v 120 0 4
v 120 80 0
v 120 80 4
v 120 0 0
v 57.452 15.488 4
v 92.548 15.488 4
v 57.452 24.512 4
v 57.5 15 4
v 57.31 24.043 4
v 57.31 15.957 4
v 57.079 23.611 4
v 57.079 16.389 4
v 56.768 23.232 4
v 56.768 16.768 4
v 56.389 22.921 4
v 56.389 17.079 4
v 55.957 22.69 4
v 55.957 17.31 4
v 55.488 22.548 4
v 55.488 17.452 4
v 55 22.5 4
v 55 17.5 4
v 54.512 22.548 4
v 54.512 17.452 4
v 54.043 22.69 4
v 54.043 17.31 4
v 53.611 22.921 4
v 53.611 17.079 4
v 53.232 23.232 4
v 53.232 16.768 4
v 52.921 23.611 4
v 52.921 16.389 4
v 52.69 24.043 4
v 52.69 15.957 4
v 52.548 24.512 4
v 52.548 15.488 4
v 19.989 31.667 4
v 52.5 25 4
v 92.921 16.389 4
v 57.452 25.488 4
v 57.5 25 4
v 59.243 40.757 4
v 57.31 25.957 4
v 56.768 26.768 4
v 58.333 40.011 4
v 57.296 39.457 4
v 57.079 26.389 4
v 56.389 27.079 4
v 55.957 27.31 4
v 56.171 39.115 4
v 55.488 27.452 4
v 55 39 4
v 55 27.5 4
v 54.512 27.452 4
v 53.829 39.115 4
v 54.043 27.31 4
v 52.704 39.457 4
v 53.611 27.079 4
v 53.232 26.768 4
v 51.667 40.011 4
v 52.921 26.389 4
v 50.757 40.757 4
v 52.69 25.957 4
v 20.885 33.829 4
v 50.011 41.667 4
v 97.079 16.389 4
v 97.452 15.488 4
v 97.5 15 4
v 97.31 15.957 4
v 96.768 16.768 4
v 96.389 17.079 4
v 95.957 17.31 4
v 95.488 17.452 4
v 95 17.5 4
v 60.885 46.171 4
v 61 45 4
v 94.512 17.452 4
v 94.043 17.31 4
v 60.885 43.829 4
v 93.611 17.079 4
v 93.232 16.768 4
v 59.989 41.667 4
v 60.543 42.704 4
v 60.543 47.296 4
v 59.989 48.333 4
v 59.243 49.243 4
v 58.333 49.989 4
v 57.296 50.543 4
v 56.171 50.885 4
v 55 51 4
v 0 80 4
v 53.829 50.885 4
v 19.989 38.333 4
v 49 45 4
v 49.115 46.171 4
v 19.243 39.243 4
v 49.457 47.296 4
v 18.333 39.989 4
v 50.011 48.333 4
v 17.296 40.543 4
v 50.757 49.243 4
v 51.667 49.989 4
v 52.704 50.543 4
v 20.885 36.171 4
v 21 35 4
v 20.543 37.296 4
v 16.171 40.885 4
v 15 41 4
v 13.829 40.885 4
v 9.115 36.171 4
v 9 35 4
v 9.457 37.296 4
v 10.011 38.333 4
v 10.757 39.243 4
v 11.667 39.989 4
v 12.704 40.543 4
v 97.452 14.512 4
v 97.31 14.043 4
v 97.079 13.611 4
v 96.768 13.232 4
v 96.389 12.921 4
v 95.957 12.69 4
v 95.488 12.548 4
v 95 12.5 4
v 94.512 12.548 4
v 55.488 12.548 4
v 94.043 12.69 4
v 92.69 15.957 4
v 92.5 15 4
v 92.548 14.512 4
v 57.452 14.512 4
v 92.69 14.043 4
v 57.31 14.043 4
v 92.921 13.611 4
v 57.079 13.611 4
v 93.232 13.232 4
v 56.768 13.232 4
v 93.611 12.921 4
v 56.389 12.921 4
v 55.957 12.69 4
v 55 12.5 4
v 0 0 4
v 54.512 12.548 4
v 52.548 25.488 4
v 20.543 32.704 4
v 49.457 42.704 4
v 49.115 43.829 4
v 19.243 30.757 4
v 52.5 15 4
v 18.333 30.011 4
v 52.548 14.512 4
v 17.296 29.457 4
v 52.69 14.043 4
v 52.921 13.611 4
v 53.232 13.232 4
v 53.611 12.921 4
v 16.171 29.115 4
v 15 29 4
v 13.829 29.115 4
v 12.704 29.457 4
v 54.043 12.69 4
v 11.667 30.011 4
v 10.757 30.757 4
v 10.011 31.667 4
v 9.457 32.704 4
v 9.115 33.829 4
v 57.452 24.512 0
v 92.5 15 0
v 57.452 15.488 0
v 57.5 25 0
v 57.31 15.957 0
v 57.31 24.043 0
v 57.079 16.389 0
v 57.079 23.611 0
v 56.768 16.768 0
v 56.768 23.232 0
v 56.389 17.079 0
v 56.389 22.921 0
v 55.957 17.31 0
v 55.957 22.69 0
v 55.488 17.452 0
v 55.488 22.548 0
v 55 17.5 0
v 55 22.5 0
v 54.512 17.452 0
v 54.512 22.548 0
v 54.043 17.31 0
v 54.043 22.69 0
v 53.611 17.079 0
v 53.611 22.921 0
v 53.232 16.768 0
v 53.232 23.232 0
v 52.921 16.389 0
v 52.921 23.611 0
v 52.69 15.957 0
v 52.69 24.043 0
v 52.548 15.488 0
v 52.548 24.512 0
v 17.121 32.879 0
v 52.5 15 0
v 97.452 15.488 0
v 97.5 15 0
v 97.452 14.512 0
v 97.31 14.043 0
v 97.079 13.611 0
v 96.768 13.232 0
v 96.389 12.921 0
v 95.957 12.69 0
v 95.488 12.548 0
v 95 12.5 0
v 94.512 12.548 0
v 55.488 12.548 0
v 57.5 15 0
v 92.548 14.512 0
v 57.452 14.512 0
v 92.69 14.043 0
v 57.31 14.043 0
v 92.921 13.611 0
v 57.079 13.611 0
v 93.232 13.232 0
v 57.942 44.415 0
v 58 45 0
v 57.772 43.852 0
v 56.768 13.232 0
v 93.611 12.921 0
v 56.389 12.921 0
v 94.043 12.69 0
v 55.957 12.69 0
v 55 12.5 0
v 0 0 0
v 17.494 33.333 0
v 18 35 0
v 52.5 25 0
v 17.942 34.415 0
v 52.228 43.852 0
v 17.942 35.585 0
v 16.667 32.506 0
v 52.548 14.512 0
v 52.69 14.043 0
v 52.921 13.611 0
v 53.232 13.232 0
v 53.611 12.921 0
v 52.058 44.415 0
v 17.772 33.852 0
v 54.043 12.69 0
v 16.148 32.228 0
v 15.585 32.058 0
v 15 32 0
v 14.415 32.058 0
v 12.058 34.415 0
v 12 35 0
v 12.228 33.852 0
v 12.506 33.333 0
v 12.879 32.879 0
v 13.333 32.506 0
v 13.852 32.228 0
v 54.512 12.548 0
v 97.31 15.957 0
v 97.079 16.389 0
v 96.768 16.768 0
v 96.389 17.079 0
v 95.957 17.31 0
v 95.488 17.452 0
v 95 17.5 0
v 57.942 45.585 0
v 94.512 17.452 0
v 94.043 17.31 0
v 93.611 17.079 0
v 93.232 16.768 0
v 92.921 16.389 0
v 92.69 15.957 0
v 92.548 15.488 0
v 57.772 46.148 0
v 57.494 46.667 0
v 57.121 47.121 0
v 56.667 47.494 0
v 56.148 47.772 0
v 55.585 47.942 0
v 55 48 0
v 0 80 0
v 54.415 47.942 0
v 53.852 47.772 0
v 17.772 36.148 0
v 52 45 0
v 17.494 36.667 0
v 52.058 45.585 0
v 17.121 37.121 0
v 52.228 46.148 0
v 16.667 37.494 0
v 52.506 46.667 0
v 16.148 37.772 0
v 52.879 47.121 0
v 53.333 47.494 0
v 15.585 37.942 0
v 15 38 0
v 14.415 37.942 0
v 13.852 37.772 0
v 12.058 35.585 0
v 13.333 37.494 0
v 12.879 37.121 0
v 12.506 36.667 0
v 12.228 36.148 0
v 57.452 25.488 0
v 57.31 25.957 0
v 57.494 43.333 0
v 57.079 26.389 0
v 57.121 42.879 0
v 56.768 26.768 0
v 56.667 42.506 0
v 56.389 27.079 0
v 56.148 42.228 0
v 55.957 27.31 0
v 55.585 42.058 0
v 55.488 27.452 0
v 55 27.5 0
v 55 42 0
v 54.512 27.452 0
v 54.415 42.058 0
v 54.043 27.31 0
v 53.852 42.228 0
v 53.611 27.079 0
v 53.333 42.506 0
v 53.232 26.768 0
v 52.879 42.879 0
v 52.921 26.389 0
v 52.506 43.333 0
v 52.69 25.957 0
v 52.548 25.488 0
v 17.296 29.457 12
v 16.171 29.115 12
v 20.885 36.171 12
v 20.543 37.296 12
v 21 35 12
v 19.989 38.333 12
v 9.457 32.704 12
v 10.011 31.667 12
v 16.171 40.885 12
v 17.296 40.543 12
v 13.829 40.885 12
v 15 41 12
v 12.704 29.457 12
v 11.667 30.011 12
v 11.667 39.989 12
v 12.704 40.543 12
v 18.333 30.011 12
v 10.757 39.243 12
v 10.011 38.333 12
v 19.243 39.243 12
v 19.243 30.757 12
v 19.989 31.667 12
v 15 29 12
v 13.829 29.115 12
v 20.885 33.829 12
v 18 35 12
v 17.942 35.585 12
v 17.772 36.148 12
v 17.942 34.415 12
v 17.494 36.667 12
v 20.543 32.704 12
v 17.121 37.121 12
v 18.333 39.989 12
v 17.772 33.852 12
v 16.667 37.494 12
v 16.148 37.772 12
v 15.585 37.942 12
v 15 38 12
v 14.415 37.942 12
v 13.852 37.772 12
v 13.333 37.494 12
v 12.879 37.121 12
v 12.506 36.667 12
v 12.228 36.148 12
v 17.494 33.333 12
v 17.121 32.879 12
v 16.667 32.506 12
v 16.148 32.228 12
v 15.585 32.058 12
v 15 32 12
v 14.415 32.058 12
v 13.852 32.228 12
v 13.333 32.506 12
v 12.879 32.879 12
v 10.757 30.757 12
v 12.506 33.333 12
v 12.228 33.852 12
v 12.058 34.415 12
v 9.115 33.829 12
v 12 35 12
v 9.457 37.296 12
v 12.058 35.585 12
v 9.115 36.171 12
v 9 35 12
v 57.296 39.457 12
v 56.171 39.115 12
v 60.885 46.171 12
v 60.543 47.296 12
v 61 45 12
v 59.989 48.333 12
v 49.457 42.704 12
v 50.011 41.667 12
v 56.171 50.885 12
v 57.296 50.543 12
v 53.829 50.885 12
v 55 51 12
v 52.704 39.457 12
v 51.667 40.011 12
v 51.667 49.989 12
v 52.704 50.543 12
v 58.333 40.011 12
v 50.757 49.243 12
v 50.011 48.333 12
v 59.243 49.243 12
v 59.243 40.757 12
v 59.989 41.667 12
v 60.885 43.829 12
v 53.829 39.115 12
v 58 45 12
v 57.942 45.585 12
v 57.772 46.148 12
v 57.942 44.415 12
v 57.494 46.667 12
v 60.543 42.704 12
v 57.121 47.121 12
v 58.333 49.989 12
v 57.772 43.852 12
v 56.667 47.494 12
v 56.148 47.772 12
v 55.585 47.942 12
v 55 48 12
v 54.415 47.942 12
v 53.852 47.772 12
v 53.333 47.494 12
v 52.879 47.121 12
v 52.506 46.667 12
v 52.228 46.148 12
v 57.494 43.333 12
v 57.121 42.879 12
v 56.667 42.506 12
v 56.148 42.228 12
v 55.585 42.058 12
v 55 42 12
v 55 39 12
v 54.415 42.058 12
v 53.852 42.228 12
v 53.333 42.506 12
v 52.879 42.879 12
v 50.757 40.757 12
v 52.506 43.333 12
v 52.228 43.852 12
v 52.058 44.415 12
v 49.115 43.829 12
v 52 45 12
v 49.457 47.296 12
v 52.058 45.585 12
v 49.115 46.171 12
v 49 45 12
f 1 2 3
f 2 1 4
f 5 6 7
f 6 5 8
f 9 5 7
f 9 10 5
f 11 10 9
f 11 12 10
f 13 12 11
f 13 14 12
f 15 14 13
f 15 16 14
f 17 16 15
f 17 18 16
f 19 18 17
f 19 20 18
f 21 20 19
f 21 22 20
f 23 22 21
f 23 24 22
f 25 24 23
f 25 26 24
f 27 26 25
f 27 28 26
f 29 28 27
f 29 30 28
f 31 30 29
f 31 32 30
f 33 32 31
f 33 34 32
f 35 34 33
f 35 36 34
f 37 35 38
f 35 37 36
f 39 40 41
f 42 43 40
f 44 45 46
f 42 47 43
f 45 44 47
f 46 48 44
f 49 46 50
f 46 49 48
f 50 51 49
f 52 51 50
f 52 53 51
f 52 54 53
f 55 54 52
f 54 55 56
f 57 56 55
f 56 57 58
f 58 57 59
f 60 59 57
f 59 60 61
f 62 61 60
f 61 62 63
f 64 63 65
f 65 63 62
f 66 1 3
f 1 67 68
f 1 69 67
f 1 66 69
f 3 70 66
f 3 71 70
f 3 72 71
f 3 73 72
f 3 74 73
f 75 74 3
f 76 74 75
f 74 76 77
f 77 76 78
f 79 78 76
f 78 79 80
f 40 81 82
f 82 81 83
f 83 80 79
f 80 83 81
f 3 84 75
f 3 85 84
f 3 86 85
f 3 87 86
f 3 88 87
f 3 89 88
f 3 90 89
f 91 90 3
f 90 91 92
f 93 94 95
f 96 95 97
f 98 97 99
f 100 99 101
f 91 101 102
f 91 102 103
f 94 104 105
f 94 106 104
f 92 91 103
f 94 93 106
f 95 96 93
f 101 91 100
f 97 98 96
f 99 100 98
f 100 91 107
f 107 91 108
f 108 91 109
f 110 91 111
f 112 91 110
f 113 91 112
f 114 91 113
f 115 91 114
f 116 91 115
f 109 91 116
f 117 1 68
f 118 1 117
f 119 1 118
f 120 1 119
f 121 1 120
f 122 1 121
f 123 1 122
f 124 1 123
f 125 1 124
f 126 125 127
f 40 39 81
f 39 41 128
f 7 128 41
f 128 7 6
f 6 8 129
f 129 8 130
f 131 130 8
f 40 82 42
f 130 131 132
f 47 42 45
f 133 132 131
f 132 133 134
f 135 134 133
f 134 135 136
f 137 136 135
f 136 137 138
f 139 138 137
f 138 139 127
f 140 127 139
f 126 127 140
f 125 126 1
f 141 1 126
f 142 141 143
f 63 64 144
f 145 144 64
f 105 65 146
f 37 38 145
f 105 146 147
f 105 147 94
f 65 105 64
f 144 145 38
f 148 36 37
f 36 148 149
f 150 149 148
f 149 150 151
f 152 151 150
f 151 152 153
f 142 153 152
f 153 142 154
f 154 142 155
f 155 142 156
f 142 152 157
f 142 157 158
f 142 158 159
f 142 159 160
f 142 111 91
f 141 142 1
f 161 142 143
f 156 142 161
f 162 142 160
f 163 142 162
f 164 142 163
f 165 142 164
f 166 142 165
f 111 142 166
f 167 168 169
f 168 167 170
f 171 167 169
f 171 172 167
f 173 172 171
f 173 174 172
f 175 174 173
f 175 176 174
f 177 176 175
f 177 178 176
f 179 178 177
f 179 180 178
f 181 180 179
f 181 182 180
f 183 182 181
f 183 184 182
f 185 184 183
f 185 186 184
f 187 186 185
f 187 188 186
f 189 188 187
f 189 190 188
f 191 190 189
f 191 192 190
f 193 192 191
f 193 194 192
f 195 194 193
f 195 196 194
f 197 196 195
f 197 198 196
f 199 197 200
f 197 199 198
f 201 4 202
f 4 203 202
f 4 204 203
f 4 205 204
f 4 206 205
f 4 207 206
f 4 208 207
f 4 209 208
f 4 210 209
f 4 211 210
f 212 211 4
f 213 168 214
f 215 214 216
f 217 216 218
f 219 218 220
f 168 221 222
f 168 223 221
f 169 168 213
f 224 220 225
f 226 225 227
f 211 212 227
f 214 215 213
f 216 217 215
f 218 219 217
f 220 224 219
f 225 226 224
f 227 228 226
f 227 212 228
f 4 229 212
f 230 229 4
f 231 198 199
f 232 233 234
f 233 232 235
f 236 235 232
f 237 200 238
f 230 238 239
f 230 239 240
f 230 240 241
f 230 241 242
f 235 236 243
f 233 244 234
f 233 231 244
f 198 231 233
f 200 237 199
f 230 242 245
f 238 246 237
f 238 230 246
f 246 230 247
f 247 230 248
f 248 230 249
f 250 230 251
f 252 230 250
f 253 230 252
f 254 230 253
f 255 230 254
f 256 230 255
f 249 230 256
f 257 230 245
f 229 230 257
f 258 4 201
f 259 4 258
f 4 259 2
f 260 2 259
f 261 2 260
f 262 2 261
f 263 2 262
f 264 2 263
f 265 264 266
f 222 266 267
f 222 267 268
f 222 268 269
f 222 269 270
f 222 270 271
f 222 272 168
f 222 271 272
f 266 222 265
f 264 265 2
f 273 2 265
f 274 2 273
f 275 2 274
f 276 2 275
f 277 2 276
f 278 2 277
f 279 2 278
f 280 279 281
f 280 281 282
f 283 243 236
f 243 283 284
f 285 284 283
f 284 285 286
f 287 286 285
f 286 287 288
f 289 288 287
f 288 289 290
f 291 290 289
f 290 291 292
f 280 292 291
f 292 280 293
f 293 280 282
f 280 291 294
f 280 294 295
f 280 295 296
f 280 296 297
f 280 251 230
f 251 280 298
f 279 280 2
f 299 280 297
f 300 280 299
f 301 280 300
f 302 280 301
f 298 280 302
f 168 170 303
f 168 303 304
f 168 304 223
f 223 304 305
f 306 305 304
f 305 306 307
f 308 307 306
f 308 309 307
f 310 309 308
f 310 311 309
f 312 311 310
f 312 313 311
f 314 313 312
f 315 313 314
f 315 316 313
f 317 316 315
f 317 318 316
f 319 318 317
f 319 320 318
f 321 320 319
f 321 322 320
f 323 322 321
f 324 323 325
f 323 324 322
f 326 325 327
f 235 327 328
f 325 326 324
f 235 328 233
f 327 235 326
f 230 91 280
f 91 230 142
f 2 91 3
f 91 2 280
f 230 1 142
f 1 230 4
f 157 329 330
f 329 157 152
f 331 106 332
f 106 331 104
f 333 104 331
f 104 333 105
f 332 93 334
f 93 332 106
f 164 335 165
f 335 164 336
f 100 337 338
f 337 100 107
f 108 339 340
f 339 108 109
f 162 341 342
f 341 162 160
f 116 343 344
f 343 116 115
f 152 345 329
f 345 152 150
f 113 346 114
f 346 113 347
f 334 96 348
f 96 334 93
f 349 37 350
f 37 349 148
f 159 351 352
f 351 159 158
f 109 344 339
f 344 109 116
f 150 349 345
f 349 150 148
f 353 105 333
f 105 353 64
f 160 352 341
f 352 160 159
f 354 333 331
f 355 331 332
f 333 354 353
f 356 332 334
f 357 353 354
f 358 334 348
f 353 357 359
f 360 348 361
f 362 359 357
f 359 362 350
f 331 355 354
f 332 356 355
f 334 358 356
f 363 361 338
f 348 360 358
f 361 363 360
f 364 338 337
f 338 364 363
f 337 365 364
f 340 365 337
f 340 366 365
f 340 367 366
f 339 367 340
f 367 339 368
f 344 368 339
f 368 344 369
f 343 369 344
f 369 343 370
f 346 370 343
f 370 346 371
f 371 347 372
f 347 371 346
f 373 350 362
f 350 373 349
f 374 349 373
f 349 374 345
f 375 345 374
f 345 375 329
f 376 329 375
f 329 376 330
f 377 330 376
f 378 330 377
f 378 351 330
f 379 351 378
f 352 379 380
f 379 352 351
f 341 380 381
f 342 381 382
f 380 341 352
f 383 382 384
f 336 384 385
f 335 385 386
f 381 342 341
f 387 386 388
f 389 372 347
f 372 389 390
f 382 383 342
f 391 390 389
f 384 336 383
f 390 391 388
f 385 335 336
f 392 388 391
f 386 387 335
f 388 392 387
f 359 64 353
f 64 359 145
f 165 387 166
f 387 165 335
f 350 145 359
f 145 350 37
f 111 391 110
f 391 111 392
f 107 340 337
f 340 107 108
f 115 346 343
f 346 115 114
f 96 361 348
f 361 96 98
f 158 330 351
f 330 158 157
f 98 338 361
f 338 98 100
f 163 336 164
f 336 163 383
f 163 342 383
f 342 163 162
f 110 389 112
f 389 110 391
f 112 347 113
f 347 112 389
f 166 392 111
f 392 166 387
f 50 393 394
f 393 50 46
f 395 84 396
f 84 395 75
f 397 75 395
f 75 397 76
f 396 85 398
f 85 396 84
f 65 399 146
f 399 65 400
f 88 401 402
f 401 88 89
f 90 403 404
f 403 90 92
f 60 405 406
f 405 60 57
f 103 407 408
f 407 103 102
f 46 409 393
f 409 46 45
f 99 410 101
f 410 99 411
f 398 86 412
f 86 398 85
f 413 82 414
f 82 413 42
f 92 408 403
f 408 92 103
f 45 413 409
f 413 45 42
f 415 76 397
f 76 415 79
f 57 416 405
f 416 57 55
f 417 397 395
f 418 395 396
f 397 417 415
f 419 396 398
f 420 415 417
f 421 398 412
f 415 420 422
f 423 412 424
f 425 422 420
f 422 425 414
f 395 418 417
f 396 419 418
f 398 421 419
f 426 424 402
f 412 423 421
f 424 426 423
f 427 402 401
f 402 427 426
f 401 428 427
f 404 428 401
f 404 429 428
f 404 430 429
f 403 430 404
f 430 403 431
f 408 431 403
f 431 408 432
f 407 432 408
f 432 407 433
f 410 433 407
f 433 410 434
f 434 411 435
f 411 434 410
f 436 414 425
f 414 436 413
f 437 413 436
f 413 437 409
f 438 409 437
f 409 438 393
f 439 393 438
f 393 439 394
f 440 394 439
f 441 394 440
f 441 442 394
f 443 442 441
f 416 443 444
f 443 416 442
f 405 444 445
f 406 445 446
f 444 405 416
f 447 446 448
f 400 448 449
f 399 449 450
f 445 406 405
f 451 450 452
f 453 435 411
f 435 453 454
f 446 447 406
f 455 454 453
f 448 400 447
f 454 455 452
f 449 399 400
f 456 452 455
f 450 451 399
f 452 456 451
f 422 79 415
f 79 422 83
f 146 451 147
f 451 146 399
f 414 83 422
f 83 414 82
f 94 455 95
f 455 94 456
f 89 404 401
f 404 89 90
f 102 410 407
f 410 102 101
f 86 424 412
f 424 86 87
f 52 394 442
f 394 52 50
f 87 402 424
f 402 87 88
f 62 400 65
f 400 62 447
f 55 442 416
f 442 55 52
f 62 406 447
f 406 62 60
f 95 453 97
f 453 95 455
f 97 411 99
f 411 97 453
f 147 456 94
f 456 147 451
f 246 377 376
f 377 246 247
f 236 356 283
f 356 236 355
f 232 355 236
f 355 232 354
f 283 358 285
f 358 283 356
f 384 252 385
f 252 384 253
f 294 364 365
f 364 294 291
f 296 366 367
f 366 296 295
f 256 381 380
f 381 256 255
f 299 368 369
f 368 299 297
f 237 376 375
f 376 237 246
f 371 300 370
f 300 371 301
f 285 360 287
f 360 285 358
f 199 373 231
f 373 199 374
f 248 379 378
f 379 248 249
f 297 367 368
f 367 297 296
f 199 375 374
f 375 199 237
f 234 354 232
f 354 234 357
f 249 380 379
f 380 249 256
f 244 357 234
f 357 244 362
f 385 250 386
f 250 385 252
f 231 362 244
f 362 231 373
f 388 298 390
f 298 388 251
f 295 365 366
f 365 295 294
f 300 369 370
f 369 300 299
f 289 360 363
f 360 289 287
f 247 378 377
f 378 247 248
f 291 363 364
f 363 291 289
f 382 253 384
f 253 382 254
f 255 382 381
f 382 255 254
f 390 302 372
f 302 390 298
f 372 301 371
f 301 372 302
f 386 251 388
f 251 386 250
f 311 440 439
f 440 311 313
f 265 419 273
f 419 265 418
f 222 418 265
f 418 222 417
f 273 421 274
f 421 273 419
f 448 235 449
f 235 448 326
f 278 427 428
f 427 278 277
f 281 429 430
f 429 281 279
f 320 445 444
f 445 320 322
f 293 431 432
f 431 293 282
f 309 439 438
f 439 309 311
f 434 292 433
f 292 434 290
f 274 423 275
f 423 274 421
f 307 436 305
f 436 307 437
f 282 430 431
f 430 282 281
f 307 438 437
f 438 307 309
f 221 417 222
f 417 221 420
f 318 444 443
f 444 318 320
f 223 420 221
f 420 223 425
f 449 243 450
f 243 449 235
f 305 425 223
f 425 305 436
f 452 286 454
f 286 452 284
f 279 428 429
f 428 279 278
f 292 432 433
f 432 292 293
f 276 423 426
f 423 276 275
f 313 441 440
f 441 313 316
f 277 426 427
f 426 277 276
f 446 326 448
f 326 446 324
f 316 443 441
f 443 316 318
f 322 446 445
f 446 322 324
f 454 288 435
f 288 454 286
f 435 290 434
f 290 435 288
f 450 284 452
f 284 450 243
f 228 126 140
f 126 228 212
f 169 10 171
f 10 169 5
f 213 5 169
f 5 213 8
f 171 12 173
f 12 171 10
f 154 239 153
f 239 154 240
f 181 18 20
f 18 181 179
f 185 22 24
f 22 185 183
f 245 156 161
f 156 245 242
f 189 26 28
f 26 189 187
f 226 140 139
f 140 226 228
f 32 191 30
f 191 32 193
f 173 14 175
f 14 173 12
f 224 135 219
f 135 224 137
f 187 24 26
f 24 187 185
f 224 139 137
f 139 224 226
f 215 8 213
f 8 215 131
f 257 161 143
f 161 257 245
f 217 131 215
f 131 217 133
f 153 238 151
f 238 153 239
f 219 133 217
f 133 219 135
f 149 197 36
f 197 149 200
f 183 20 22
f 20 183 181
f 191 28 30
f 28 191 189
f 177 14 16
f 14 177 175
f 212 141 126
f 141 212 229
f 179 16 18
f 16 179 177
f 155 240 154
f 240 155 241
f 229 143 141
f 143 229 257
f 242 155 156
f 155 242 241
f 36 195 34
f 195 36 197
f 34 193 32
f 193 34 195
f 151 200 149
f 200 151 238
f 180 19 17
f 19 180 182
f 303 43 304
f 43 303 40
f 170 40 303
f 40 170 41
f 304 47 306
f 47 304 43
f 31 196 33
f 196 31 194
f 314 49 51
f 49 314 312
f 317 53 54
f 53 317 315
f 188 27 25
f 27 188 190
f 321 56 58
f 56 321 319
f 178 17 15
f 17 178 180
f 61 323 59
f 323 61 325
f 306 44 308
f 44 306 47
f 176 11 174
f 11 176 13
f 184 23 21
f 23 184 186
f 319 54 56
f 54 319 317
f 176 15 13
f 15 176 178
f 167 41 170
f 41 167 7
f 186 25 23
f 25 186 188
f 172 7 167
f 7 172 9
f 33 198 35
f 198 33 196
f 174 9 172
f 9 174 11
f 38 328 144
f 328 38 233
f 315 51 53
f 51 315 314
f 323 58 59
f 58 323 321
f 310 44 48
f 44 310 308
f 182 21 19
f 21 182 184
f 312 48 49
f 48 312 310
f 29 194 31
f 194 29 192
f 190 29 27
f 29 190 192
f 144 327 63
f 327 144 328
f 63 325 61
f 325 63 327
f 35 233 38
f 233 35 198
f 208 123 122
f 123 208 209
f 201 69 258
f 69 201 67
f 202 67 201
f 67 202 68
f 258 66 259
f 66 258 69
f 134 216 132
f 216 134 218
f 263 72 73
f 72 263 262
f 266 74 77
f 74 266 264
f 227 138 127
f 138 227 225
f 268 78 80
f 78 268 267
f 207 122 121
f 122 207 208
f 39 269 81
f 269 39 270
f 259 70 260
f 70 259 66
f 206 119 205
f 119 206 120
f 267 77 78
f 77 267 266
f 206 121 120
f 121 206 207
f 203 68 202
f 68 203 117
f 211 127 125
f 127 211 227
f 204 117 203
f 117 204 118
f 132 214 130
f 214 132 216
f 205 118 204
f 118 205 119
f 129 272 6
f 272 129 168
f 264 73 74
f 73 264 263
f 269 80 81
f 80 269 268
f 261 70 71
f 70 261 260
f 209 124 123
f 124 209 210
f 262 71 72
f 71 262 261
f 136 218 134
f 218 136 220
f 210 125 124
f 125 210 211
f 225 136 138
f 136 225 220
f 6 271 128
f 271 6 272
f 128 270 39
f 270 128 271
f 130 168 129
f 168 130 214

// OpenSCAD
$fn = 32;

// ----------------------------------------------------------------------
// Mixed field: bosses and holes at given coordinates
// ----------------------------------------------------------------------

// --- parameters (mm) ---
plate_l = 120;            // plate length, X
plate_w = 80;             // plate width, Y
plate_t = 4;              // plate thickness, Z
boss_d = 12;              // boss diameter
boss_h = 8;               // boss height above the plate
hole_d = 5;               // through hole diameter

total_h = plate_t + boss_h;  // overall height

difference() {
  union() {
    cube([plate_l, plate_w, plate_t]);
    translate([15, 35, plate_t]) cylinder(h = boss_h, d = boss_d);
    translate([55, 45, plate_t]) cylinder(h = boss_h, d = boss_d);
  }
  translate([15, 35, -1]) cylinder(h = total_h + 2, d = boss_d / 2);
  translate([55, 45, -1]) cylinder(h = total_h + 2, d = boss_d / 2);
  translate([55, 15, -1]) cylinder(h = plate_t + 2, d = hole_d);
  translate([55, 25, -1]) cylinder(h = plate_t + 2, d = hole_d);
  translate([95, 15, -1]) cylinder(h = plate_t + 2, d = hole_d);
}
